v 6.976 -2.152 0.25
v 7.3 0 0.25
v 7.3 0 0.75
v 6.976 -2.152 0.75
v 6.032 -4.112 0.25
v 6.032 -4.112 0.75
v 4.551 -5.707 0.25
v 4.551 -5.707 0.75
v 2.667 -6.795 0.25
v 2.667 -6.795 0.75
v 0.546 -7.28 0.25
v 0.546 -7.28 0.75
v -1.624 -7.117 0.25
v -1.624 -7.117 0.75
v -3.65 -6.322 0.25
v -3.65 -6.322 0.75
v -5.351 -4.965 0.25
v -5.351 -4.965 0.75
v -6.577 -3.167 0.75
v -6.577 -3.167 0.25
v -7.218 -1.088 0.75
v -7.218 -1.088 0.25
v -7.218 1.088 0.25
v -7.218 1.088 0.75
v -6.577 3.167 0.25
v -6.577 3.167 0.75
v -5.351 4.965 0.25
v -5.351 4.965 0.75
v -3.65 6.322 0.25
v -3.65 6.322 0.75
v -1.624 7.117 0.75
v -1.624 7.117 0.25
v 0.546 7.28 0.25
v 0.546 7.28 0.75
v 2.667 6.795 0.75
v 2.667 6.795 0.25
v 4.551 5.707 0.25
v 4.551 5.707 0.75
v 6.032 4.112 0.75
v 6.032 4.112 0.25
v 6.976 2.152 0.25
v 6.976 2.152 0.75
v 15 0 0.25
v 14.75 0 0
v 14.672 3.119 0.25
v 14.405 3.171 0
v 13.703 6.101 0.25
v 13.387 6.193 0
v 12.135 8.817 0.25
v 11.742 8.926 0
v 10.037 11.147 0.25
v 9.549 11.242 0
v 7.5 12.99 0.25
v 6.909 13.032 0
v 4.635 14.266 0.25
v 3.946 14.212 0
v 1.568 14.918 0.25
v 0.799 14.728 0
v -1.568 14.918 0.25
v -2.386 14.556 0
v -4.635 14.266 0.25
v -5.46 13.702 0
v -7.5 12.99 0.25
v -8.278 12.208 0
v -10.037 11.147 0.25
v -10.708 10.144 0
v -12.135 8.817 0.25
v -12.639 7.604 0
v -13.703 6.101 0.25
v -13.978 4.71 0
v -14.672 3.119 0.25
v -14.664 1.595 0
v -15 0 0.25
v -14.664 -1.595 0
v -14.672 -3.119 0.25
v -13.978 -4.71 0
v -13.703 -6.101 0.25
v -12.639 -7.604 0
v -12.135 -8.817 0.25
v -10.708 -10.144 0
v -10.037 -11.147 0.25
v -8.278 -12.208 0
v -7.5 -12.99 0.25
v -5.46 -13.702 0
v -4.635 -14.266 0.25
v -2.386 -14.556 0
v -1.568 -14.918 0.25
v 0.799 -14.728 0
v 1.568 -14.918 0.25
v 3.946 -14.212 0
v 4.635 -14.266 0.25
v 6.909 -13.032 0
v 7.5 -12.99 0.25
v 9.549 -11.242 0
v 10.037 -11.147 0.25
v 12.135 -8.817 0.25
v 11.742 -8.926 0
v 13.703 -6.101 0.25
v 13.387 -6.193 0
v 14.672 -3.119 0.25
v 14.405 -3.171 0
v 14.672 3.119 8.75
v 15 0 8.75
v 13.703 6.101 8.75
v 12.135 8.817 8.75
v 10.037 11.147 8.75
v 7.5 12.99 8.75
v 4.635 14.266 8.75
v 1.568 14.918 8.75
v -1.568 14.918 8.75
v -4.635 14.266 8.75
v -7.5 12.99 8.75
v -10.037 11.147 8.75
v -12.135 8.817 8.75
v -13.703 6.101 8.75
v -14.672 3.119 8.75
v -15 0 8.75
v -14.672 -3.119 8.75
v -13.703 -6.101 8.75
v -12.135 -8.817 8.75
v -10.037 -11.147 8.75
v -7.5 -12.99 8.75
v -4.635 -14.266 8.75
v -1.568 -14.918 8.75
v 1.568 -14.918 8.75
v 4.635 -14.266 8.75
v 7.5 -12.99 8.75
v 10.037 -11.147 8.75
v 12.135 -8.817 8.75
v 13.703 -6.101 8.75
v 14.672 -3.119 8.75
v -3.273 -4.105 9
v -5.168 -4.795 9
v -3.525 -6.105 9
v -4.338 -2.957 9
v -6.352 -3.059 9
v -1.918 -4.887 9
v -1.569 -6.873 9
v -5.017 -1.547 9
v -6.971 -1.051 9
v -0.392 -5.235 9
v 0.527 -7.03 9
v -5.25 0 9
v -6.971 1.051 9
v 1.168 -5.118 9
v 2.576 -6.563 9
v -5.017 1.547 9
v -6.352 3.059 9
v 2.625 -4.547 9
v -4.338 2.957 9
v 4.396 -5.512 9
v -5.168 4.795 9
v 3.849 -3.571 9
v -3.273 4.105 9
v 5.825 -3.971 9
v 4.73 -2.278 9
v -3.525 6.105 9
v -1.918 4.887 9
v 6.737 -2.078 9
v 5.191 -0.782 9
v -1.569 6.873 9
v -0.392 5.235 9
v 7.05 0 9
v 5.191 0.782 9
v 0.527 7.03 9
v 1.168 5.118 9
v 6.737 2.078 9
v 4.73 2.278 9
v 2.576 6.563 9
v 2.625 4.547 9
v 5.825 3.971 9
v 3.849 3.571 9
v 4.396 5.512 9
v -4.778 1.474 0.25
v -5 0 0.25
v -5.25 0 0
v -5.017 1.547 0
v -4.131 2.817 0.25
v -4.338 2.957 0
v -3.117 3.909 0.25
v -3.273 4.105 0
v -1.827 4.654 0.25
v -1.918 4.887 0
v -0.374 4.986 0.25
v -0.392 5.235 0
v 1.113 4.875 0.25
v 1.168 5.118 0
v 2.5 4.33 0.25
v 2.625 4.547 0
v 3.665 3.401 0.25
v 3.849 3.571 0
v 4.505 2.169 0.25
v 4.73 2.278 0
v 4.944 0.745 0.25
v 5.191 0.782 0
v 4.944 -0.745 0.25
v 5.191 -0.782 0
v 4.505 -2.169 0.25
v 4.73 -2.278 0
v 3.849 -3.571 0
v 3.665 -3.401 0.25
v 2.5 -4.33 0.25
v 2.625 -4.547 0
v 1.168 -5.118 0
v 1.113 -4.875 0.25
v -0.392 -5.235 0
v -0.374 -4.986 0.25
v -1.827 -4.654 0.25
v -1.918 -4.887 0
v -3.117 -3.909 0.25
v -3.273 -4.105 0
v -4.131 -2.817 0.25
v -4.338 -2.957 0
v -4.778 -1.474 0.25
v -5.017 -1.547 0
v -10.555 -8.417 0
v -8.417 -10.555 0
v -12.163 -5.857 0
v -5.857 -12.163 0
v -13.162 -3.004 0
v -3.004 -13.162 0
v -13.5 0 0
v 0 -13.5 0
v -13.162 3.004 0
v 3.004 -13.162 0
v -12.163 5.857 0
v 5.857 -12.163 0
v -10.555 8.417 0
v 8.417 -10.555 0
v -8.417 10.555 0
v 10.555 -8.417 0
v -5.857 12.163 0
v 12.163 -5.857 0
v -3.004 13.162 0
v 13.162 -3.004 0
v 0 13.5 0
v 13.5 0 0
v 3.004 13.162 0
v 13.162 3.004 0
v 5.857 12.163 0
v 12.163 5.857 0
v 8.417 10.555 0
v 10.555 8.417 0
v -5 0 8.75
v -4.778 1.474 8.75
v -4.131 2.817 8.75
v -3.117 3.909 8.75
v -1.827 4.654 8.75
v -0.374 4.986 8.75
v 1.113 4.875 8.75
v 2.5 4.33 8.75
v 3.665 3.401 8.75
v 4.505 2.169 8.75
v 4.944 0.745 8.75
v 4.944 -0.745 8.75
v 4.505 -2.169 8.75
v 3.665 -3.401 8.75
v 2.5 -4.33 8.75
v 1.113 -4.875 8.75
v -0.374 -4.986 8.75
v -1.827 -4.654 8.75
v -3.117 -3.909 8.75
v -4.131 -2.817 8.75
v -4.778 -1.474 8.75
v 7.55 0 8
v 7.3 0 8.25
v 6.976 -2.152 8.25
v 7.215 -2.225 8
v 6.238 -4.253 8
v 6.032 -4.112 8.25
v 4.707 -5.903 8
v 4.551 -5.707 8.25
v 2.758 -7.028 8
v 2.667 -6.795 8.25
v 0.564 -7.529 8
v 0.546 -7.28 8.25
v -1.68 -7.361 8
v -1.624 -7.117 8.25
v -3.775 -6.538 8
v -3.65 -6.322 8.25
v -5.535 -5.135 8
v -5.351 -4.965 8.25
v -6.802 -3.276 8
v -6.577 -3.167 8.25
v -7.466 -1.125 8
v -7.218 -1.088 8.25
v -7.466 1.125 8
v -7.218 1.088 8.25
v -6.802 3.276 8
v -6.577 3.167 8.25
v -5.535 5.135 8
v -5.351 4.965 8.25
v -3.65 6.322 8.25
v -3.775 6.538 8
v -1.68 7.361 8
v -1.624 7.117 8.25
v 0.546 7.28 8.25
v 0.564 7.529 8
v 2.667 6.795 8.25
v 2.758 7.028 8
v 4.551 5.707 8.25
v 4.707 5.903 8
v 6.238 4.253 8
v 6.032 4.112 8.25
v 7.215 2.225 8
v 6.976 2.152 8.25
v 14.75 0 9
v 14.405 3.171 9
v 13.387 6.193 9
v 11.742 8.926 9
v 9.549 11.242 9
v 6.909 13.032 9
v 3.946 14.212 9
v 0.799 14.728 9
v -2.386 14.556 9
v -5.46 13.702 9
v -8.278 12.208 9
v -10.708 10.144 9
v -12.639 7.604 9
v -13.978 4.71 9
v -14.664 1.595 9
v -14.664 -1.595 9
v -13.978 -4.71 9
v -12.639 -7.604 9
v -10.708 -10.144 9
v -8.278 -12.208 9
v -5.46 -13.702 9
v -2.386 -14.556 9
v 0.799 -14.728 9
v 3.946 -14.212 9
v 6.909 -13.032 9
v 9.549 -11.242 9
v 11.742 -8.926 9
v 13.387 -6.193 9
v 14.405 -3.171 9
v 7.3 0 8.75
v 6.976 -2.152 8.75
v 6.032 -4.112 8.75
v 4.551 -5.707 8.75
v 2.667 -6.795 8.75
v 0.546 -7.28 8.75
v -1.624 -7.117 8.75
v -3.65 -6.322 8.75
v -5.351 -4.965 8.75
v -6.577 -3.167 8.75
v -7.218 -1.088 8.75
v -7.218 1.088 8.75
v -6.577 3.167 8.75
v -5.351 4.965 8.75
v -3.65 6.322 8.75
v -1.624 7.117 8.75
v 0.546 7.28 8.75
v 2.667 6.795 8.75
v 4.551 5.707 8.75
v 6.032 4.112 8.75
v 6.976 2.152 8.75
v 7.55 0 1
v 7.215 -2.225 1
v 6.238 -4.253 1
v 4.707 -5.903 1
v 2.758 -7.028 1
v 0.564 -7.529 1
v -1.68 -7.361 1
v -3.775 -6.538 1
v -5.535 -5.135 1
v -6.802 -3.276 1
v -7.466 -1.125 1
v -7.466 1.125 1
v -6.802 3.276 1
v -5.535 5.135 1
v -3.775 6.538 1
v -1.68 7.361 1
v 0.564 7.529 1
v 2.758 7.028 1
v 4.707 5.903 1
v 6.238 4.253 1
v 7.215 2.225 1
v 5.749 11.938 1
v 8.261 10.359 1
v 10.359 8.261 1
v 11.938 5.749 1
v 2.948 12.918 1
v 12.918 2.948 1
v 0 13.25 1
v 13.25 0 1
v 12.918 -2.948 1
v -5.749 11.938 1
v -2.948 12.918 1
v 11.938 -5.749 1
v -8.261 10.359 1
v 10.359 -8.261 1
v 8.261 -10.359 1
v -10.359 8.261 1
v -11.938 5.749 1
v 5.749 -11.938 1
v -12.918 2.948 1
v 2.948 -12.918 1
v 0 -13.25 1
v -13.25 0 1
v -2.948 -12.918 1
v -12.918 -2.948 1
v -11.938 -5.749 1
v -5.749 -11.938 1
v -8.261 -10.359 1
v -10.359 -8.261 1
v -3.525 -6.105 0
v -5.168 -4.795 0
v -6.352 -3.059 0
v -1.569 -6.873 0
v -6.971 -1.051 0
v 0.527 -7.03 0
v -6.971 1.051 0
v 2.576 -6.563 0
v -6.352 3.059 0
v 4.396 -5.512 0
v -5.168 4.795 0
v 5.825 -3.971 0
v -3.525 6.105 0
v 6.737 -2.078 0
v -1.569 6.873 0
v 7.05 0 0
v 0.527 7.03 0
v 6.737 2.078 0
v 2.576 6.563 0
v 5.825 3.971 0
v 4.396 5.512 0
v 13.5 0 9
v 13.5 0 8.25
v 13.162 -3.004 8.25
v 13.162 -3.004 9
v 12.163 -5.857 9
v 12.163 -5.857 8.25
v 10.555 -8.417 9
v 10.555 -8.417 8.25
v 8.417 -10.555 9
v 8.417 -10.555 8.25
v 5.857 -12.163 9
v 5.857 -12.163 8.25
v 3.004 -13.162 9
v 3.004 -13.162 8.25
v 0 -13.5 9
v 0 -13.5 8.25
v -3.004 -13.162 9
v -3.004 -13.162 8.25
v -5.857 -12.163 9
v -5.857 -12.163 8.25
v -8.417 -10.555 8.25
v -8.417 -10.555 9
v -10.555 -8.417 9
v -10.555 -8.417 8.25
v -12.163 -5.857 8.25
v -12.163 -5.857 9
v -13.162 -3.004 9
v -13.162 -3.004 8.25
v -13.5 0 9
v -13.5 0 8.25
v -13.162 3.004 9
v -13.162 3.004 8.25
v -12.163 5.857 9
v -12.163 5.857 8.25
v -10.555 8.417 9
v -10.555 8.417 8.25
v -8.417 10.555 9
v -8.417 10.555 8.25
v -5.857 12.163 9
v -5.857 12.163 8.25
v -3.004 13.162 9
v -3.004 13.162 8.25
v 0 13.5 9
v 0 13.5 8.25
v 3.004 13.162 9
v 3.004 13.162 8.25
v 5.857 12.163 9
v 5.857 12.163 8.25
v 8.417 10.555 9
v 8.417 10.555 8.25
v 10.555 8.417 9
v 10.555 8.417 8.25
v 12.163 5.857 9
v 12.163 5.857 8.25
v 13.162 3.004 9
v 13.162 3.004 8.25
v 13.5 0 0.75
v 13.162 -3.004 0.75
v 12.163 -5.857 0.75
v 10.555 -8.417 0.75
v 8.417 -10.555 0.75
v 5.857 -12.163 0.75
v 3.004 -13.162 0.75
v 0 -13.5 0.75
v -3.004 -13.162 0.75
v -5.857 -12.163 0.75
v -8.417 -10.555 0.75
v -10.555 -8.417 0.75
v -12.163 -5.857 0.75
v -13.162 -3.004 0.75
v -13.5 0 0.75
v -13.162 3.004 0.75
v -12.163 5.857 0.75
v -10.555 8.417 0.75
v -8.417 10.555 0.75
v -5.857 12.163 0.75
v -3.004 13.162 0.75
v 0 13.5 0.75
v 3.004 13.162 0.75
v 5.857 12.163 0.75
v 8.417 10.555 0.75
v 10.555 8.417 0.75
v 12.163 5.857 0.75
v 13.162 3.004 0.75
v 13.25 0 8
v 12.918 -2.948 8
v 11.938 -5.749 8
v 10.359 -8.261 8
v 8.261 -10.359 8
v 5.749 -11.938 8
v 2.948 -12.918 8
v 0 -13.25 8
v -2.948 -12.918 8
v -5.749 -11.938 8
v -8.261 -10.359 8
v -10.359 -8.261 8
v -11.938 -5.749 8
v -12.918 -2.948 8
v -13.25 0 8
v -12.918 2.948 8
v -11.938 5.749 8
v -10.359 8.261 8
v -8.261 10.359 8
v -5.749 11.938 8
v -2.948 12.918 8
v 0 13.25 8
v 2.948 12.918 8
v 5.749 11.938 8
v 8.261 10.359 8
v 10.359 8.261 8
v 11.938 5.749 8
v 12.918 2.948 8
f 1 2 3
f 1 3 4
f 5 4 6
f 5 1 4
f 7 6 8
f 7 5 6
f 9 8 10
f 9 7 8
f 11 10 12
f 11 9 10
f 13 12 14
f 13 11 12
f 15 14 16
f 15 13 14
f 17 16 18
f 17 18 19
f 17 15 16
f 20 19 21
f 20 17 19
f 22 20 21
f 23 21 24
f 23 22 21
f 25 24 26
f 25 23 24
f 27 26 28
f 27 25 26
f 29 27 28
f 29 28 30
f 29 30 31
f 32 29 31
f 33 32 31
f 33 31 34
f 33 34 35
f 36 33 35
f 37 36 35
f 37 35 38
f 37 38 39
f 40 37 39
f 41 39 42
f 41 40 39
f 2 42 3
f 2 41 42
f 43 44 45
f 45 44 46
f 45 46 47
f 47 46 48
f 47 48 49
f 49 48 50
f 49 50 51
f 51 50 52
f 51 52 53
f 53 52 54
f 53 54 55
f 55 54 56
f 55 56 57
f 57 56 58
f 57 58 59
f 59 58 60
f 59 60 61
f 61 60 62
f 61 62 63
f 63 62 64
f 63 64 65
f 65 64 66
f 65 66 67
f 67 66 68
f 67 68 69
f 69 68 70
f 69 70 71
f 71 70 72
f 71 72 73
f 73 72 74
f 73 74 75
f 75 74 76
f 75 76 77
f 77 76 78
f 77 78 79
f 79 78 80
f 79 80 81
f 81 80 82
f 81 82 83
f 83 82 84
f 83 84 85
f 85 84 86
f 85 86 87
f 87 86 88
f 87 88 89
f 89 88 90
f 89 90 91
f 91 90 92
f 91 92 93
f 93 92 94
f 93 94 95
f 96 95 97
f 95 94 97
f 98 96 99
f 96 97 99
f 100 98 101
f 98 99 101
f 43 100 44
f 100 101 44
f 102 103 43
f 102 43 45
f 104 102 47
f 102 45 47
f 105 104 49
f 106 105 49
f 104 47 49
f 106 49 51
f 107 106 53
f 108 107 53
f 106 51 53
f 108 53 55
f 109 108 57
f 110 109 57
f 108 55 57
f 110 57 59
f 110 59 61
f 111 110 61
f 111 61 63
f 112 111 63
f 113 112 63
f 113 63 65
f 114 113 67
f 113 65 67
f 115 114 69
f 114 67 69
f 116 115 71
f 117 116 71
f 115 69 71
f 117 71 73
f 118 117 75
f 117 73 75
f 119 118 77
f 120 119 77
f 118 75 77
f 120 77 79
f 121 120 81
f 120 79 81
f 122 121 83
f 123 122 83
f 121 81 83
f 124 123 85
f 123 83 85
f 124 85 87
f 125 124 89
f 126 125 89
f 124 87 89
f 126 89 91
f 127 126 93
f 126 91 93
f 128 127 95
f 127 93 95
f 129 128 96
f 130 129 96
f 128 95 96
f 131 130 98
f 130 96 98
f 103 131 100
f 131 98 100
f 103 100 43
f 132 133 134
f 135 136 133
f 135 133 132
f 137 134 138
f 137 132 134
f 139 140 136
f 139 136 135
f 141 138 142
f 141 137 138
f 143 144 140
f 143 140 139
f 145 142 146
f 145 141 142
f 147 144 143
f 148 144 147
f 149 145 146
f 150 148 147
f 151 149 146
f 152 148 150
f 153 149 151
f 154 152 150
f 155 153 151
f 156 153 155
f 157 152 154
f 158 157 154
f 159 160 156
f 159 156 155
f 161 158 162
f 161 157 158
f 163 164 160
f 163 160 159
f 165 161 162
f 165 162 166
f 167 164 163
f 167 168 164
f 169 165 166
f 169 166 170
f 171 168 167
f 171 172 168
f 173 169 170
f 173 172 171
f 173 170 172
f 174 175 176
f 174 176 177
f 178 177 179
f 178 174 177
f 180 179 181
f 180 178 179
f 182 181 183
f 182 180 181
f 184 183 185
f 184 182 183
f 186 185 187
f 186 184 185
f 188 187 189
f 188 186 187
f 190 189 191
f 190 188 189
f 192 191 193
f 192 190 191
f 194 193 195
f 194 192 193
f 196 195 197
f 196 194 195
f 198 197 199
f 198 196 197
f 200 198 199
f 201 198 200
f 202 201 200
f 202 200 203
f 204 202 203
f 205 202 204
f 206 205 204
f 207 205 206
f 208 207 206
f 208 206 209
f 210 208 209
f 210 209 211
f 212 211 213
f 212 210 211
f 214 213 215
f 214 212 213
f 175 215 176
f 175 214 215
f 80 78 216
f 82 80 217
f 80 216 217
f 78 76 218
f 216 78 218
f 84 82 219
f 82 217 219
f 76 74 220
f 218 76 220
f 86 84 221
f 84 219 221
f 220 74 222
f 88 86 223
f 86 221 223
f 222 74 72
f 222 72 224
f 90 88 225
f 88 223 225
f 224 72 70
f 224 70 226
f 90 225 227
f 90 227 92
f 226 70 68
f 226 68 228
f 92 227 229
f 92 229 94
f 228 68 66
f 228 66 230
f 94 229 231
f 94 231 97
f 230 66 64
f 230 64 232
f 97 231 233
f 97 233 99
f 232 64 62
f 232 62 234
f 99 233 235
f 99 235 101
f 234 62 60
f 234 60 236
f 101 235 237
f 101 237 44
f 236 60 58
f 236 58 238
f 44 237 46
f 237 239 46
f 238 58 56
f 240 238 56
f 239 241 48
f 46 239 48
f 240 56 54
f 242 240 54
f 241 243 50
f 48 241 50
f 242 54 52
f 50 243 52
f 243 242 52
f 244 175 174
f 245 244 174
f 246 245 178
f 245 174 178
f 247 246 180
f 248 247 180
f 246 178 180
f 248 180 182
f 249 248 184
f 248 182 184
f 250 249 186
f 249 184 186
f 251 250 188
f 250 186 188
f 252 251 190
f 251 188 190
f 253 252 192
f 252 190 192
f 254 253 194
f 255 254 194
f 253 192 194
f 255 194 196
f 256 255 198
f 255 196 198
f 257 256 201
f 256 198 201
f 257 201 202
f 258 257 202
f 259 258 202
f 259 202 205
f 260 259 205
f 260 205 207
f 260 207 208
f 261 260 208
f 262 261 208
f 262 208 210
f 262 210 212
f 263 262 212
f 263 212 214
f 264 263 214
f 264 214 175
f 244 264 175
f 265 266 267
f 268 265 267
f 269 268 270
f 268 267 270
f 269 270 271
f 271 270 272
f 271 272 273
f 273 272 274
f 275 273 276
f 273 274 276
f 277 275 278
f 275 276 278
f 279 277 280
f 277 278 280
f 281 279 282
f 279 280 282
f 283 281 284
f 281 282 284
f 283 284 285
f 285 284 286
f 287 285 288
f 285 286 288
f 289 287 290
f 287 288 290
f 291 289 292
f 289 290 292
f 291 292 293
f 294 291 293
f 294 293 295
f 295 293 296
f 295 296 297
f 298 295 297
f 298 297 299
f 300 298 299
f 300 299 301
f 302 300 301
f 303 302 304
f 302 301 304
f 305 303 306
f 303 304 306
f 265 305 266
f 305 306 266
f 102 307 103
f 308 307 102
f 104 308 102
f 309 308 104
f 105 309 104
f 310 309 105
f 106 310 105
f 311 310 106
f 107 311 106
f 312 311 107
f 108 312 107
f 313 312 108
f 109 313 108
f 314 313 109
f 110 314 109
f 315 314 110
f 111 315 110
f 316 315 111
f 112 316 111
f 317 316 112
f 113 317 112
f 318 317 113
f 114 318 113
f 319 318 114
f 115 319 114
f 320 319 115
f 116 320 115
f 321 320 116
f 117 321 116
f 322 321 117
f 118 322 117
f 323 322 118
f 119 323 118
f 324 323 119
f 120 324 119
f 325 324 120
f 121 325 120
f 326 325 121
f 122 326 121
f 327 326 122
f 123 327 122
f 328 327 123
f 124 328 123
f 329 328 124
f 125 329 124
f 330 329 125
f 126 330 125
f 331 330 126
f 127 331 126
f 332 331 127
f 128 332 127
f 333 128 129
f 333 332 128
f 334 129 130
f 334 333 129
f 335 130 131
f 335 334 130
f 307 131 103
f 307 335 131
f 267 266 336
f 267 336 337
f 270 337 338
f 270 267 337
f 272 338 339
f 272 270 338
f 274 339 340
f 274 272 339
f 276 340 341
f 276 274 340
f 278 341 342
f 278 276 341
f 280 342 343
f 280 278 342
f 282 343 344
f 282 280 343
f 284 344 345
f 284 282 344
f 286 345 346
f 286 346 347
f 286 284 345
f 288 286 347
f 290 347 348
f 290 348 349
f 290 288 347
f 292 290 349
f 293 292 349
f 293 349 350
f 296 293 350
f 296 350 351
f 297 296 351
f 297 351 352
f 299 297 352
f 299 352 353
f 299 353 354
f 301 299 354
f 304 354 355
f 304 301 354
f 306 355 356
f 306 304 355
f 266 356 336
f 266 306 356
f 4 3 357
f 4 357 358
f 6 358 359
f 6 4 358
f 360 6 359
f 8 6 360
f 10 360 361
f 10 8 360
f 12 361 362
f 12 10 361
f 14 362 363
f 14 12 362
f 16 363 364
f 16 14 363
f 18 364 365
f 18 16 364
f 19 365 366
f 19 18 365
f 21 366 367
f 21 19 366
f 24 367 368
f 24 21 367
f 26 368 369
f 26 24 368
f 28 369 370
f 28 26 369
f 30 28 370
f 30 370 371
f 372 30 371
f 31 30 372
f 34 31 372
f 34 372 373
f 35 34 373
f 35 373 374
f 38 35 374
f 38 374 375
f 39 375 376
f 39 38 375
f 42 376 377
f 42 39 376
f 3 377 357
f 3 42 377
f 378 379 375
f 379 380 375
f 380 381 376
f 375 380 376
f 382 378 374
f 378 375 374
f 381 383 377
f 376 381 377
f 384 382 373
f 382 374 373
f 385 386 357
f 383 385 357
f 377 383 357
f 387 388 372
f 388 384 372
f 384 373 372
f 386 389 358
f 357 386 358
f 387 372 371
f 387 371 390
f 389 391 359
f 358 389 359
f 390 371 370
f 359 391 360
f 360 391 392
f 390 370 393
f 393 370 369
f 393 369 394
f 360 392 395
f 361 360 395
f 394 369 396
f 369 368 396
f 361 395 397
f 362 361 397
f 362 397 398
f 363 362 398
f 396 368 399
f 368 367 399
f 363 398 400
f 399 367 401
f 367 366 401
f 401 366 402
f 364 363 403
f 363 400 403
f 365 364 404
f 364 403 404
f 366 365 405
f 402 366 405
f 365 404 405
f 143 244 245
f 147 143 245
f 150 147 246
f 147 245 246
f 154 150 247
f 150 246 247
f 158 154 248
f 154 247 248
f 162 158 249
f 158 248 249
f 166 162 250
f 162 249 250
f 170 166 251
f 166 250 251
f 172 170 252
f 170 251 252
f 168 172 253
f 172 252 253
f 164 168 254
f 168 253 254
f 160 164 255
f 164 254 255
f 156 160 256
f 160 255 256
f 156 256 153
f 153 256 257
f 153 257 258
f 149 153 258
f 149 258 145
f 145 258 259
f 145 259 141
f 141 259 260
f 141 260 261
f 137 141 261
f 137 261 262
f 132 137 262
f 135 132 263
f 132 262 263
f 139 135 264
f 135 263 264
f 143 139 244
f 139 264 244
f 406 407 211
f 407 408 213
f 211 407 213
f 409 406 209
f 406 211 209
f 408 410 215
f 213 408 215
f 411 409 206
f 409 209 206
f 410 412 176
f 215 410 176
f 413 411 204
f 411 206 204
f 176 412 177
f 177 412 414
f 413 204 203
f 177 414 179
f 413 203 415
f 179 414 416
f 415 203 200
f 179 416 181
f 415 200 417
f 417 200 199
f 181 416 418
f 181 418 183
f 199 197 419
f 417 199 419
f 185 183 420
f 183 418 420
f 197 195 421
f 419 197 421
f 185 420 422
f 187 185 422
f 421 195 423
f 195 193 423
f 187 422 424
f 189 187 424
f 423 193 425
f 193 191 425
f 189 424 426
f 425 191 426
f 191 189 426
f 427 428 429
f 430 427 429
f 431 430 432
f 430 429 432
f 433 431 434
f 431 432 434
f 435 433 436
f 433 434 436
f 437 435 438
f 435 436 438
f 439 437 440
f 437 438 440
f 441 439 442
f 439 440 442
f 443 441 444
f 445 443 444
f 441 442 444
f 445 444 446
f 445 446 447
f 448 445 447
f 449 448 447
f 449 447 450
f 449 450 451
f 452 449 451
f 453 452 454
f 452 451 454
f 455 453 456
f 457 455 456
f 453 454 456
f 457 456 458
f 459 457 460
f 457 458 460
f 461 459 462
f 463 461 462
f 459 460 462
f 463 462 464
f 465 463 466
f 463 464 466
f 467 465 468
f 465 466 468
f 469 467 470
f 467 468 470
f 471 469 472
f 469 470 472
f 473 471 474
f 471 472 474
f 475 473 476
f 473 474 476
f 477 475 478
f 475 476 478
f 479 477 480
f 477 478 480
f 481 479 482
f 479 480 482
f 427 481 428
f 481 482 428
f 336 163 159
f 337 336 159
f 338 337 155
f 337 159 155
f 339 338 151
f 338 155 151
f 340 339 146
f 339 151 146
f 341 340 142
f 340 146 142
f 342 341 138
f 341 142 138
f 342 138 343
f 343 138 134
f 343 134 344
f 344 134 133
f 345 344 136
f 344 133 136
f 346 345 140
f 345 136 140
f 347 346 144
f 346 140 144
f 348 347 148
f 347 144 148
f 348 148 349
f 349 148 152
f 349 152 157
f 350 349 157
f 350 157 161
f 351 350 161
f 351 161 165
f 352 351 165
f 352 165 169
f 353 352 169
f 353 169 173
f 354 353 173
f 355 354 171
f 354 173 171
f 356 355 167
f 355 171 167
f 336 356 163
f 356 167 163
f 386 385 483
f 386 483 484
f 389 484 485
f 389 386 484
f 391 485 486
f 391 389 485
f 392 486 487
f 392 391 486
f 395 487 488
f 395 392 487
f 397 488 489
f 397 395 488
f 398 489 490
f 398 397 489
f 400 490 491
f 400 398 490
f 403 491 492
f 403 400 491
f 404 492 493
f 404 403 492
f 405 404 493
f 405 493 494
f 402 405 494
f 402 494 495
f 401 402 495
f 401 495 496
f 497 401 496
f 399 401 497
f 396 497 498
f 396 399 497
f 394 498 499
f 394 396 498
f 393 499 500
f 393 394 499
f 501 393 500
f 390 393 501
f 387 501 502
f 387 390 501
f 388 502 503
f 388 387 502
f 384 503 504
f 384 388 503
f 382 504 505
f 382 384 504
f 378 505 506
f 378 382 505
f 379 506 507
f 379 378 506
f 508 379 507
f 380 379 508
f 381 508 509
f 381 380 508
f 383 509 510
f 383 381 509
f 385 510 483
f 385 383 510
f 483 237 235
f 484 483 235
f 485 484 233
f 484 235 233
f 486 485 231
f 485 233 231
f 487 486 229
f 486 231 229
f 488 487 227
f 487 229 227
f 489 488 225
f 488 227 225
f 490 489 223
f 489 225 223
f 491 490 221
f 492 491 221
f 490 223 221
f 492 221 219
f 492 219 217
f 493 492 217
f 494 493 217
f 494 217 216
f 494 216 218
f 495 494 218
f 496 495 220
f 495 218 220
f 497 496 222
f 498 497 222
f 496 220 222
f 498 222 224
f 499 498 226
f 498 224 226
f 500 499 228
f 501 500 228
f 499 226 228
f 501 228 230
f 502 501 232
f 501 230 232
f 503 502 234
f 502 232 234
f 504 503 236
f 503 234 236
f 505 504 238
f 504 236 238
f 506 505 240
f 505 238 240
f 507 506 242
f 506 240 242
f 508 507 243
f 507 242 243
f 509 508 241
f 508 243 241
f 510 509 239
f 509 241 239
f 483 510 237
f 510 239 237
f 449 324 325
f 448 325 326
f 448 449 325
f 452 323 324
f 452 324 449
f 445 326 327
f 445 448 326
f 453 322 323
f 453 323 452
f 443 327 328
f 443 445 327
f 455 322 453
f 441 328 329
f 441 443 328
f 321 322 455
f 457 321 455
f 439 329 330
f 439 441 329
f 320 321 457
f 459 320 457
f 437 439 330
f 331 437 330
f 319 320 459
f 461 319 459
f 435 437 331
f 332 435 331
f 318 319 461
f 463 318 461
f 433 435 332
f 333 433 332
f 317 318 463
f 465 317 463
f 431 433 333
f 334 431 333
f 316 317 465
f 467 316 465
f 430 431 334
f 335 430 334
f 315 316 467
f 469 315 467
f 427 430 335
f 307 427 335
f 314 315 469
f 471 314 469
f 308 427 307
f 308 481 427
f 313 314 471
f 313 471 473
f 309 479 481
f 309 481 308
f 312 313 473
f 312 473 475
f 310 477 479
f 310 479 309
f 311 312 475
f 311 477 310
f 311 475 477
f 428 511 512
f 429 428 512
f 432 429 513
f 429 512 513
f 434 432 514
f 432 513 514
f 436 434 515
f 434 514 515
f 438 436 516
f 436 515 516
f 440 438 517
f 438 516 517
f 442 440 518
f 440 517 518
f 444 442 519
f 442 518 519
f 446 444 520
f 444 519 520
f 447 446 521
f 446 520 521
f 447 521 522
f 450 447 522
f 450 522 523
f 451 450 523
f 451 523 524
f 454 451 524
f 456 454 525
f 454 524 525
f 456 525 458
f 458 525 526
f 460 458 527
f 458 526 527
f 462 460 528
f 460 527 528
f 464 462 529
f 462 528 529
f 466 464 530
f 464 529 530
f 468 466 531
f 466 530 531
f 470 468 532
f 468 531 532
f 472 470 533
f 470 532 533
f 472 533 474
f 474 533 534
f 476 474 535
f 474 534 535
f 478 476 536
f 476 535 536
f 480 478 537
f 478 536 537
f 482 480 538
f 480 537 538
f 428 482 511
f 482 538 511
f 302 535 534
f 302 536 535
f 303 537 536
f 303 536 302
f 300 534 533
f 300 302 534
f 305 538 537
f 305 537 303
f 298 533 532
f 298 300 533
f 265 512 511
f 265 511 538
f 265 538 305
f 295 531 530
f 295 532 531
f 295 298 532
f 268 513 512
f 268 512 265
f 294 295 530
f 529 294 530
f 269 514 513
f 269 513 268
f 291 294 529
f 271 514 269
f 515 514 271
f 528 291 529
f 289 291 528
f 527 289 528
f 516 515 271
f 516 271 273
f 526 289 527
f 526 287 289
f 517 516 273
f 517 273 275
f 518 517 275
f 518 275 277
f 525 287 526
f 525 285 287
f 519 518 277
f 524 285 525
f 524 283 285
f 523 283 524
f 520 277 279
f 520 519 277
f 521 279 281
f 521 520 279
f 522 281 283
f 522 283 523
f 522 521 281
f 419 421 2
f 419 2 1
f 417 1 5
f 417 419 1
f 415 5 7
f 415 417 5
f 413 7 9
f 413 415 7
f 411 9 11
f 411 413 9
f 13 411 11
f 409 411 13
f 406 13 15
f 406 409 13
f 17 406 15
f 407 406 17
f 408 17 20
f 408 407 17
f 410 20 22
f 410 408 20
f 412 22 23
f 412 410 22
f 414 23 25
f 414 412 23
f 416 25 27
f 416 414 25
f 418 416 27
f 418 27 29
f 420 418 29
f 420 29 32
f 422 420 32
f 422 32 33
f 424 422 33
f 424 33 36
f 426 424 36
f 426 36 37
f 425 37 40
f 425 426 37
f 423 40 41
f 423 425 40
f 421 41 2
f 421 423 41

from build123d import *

# Parameters (mm, degrees)
SKETCH_1_R          = 15
EXTRUDE_1_DEPTH     = 9
SKETCH_2_R          = 5
CUT_EXTRUDE_1_DEPTH = 10
SKETCH_3_W          = 6.2
SKETCH_3_H          = 1
CHAMFER_1_SIZE      = 0.25


with BuildPart() as part:
    # Эскиз1 → Бобышка-Вытянуть1 (new body)
    with BuildSketch(Plane.XY):
        Circle(SKETCH_1_R)
    extrude(amount=EXTRUDE_1_DEPTH)

    # Эскиз2 → Вырез-Вытянуть1 (cut, through all)
    with BuildSketch(Plane(origin=(0, 0, 0), x_dir=(-1, 0, 0), z_dir=(0, 0, -1))):
        Circle(SKETCH_2_R)
    extrude(amount=-CUT_EXTRUDE_1_DEPTH, mode=Mode.SUBTRACT)

    # Эскиз3 → Вырез-Повернуть1 (revolve, cut)
    with BuildSketch(Plane(origin=(0, 0, 0), x_dir=(1, 0, 0), z_dir=(0, 1, 0))):
        with Locations((10.4, -8.5)):
            Rectangle(SKETCH_3_W, SKETCH_3_H)
        with Locations((10.4, -0.5)):
            Rectangle(SKETCH_3_W, SKETCH_3_H)
    revolve(axis=Axis((0, 0, 9), (0, 0, -1)), mode=Mode.SUBTRACT)

    # Фаска1
    chamfer_1_edges = [part.edges().sort_by_distance(p)[0] for p in [
        (-7.3, 0, 9),
        (-7.3, 0, 8),
        (-13.5, 0, 8),
        (-7.3, 0, 1),
        (-13.5, 0, 1),
        (-7.3, 0, 0),
        (-15, 0, 0),
        (-15, 0, 9),
        (5, 0, 9),
        (5, 0, 0),
    ]]
    chamfer(chamfer_1_edges, length=CHAMFER_1_SIZE)


solid = part.part
